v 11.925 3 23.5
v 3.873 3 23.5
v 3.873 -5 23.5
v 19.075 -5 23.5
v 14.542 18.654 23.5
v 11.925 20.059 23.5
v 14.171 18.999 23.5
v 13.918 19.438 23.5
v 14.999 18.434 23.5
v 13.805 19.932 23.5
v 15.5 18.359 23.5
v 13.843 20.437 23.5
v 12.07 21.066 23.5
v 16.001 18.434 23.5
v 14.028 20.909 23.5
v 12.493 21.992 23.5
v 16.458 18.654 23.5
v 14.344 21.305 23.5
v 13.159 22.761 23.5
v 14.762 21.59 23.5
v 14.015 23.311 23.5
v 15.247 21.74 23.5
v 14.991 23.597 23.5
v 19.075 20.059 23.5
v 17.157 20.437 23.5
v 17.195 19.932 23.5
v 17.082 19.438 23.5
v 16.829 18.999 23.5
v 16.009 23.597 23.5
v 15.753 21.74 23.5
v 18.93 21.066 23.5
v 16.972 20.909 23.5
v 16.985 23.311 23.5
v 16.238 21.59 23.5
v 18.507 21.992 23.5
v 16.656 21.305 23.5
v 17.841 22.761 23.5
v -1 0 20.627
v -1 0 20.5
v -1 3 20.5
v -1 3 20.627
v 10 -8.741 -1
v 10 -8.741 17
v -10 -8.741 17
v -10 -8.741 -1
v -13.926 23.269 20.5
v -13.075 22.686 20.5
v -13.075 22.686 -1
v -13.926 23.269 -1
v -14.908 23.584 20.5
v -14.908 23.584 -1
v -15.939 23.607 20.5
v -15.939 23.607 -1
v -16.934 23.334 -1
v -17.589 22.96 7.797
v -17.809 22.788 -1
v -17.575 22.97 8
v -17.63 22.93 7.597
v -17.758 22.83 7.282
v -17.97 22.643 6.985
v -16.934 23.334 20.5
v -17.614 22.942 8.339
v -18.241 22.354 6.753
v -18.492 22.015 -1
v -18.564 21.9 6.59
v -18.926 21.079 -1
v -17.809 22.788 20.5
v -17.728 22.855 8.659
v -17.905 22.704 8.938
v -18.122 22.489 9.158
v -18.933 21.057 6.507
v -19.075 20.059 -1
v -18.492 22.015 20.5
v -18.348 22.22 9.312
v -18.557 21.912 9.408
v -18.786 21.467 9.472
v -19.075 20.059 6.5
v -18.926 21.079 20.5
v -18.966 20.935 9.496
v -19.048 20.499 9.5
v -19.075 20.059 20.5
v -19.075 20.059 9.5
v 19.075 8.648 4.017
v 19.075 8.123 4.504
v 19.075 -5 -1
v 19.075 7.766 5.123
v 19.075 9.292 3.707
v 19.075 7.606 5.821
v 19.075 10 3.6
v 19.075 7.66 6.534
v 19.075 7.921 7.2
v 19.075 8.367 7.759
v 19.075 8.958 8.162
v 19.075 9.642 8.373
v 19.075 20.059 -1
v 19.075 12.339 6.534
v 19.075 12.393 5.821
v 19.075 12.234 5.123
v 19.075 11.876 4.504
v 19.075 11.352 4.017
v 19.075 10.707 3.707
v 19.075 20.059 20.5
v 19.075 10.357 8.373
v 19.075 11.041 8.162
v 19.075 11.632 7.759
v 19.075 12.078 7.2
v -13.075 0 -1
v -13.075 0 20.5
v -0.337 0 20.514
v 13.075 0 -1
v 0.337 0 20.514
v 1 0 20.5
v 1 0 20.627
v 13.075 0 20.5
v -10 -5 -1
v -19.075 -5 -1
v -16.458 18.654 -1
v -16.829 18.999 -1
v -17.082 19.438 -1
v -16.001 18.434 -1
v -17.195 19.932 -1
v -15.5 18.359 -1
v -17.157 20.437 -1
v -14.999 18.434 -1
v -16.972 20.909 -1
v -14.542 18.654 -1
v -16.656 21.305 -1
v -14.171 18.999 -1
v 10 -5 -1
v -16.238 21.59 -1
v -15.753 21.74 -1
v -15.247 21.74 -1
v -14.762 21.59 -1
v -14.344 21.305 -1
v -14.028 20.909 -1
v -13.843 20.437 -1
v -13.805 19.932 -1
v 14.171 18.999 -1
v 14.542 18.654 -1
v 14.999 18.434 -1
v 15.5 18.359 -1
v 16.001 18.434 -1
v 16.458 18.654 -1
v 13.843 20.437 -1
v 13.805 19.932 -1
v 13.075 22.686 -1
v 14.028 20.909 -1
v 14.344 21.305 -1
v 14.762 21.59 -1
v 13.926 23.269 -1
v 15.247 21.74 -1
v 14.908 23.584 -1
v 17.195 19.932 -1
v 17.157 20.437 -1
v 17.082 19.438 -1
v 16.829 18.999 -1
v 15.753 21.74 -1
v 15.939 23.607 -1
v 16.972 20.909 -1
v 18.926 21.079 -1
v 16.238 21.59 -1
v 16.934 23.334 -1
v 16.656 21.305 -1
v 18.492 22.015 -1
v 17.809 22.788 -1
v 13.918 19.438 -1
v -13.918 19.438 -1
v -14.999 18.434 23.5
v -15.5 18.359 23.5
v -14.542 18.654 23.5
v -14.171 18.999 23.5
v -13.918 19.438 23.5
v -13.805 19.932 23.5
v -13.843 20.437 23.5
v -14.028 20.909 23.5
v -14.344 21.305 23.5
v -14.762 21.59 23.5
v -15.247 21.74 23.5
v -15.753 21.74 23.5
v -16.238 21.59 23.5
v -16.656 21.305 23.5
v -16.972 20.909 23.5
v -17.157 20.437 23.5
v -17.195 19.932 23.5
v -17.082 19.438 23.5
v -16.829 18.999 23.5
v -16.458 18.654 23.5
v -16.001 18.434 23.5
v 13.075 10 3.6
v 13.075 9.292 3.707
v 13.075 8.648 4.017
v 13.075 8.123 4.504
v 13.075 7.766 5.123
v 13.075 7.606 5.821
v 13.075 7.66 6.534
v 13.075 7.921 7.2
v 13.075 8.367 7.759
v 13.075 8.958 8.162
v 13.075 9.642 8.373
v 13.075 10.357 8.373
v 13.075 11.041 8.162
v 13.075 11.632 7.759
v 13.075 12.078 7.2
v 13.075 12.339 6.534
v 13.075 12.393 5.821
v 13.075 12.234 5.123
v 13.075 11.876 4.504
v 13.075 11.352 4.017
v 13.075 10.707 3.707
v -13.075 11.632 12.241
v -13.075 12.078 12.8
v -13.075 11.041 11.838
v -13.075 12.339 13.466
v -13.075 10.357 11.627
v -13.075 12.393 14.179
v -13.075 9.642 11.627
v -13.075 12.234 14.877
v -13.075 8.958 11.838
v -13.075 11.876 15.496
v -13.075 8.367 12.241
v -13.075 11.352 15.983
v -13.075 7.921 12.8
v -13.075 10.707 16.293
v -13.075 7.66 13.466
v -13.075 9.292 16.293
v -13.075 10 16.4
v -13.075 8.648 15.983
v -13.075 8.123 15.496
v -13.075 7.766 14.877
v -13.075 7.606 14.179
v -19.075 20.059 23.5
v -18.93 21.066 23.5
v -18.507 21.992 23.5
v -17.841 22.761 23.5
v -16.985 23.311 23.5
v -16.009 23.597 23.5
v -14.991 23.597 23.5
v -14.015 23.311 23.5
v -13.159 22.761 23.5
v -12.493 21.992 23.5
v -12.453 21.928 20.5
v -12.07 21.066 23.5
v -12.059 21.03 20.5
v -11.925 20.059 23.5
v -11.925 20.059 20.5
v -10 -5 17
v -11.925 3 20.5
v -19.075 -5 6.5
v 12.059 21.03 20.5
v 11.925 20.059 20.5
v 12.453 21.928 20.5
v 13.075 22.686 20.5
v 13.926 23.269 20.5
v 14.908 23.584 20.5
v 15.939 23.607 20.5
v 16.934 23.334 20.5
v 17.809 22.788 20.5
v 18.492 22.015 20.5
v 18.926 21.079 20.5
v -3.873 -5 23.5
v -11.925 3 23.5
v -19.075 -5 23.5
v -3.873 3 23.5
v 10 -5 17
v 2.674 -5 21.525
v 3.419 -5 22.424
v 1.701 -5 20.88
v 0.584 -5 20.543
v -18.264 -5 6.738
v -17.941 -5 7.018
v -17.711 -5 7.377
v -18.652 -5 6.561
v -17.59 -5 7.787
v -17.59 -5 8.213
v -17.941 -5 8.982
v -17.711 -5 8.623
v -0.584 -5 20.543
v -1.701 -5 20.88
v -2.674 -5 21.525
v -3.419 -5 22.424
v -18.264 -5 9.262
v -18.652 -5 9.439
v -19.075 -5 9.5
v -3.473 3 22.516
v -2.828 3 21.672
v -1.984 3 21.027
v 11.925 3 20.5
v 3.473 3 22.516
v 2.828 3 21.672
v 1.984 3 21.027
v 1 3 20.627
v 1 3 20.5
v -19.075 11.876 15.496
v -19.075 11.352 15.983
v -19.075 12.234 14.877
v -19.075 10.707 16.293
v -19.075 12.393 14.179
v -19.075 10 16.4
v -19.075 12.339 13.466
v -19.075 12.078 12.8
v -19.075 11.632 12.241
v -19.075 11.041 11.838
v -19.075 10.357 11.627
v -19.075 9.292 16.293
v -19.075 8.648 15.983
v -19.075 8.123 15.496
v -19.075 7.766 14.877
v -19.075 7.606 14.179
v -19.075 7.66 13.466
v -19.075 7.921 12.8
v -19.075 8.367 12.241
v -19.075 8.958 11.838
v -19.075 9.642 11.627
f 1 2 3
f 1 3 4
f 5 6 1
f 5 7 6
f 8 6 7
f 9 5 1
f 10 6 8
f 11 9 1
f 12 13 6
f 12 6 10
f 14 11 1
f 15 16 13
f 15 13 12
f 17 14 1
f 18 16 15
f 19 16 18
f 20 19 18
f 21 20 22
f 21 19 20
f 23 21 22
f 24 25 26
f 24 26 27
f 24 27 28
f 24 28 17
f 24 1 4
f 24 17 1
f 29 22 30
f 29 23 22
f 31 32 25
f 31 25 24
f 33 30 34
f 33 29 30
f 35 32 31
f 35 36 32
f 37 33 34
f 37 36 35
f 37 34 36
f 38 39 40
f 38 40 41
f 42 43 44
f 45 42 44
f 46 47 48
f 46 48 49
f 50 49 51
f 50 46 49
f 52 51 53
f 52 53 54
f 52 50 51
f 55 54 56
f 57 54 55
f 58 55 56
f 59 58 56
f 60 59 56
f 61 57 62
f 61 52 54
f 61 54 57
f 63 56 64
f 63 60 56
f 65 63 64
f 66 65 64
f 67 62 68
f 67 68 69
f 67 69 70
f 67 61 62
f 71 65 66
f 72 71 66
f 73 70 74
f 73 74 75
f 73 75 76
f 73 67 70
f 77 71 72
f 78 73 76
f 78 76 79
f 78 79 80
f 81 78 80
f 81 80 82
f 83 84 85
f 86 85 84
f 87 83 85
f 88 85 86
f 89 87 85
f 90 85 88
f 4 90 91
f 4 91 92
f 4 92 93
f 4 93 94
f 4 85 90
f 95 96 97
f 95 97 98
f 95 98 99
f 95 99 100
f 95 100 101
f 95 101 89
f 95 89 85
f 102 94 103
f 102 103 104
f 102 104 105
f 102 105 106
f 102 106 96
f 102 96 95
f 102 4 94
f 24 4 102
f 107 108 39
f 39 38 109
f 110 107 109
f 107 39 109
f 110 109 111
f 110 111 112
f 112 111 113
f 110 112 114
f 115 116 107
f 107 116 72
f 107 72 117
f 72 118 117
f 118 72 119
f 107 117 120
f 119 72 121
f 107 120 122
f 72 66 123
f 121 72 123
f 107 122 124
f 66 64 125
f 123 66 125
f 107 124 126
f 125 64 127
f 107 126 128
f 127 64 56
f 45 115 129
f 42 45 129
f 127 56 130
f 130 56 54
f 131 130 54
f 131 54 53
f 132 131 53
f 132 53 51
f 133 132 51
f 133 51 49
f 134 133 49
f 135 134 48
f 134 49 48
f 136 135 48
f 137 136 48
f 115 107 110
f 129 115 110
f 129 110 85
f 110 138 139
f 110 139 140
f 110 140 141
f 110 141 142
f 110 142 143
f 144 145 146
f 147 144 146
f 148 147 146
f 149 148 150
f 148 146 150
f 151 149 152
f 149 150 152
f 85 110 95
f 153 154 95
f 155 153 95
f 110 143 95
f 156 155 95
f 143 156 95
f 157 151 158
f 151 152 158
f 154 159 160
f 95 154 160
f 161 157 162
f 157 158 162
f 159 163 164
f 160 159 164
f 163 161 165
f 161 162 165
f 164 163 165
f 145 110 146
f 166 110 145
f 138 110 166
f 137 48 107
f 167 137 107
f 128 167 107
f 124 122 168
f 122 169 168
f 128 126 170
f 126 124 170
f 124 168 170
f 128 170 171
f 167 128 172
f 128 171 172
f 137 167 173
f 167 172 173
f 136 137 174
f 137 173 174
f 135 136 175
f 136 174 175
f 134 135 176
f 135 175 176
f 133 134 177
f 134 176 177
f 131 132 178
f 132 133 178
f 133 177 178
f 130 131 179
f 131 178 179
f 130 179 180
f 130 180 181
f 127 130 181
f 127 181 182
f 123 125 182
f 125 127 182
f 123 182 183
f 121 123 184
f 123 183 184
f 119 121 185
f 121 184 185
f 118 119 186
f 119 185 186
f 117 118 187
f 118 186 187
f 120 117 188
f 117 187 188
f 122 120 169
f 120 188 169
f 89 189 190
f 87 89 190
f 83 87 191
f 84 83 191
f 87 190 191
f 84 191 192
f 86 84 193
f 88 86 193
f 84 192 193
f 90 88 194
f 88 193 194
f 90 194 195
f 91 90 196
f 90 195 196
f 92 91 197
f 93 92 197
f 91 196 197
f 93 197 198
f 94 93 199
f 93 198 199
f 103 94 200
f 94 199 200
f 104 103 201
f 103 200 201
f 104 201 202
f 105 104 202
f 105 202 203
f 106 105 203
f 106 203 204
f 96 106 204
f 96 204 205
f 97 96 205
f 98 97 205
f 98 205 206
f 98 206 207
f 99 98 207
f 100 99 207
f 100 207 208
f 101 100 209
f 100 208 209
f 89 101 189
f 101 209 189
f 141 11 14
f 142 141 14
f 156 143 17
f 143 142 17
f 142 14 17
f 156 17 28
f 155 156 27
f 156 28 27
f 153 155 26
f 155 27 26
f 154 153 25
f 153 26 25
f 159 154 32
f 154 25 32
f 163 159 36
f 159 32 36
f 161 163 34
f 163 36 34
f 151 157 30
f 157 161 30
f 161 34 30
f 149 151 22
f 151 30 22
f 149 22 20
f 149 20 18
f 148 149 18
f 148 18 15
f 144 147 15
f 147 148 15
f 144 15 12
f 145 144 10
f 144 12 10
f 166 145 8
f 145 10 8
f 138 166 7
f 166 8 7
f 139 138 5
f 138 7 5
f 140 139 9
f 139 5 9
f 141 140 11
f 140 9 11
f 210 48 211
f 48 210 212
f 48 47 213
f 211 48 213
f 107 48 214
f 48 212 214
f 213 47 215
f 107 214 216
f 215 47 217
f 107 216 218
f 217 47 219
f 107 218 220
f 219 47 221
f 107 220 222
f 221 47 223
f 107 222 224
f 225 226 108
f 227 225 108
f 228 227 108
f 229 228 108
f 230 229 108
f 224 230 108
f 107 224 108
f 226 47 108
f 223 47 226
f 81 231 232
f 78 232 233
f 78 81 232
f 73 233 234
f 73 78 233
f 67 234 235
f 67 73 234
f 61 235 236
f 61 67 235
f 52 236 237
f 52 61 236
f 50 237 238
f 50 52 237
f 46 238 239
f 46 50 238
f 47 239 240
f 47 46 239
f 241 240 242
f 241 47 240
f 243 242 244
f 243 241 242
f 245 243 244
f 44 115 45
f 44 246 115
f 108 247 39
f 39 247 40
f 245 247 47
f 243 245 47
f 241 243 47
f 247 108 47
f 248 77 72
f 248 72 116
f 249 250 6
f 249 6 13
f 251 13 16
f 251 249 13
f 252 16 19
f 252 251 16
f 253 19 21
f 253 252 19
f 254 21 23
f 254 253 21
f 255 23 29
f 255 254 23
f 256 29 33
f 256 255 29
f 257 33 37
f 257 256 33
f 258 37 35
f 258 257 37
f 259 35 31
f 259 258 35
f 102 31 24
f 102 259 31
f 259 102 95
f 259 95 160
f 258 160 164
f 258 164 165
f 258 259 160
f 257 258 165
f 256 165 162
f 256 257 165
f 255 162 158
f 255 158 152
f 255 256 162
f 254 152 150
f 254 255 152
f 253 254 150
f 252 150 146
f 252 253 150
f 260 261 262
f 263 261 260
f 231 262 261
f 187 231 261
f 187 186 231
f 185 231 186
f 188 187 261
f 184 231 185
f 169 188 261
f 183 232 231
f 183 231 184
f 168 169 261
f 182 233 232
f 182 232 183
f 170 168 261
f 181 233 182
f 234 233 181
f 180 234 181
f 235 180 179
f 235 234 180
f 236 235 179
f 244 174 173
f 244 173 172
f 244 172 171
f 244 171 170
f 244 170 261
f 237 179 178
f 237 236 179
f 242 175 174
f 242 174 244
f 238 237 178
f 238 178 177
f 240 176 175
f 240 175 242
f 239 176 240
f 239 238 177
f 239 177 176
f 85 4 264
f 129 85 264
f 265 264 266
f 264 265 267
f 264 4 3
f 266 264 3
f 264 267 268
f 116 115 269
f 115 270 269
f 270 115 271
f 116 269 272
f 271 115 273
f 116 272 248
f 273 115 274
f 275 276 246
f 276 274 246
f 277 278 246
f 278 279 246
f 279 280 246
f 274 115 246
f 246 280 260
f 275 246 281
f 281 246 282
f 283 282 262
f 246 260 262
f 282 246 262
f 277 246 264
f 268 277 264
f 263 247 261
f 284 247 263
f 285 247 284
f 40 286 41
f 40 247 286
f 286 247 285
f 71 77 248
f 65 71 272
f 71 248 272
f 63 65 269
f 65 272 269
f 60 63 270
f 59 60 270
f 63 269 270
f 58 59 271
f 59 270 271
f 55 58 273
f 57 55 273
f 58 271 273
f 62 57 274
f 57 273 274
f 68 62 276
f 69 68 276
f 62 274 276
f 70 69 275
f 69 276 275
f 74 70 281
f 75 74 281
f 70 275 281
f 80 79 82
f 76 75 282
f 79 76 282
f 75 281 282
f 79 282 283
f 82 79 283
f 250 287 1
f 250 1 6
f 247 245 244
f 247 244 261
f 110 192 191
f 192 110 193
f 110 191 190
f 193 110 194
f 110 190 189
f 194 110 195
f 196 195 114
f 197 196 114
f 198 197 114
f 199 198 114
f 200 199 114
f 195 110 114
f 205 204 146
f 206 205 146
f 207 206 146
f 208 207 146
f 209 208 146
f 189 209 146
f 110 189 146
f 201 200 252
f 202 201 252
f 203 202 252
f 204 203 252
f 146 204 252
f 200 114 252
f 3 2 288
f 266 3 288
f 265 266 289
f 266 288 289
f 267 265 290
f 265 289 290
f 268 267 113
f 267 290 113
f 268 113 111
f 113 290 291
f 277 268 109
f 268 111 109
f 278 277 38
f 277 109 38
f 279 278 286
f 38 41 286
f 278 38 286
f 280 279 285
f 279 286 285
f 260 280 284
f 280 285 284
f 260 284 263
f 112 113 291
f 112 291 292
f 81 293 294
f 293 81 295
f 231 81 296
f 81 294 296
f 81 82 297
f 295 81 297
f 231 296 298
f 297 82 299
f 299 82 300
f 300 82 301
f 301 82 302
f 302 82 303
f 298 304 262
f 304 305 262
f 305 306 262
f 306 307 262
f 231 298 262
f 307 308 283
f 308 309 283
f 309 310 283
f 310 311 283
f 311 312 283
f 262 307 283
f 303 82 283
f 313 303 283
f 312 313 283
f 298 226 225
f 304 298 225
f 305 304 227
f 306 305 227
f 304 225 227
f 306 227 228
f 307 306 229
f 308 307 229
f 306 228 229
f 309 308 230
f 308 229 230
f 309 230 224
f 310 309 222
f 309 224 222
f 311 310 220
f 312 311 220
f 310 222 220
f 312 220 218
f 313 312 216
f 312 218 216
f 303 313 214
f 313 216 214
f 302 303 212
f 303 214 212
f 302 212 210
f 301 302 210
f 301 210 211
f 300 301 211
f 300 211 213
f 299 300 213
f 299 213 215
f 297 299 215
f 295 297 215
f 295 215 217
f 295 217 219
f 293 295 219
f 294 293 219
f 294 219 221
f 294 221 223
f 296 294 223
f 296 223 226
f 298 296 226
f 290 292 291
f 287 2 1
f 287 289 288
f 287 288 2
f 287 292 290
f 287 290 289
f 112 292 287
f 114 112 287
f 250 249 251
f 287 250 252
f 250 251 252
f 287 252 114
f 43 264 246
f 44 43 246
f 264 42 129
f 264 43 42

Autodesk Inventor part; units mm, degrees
ref_plane "YZ Plane" through (0, 0, 0) normal (1, 0, 0) x (0, 1, 0)
ref_plane "XZ Plane" through (0, 0, 0) normal (0, 1, 0) x (-1, 0, 0)
ref_plane "XY Plane" through (0, 0, 0) normal (0, 0, 1) x (1, 0, 0)
sketch "Sketch1" plane through (0, 0, 0) normal (0, 0, 1) x (1, 0, 0)
  line L0 (-13.075, 0) -> (13.075, 0)
  line L1 (13.075, 0) -> (13.075, 22.6856)
  line L2 (-13.075, 22.6856) -> (-13.075, 0)
  line L3 (-19.075, -5) -> (11.925, -5)
  line L4 (19.075, -5) -> (19.075, 20.0588)
  line L5 (-19.075, 20.0588) -> (-19.075, -5)
  circle A0 centre (-15.5, 20.0588) radius 1.5
  circle A1 centre (15.5, 20.0588) radius 1.5
  arc A2 (19.075, 20.0588) -> (13.075, 22.6856) centre (15.5, 20.0588) ccw
  arc A3 (-13.075, 22.6856) -> (-19.075, 20.0588) centre (-15.5, 20.0588) ccw
  line L6 (11.925, -5) -> (19.075, -5)
  point P0 (0, 0)
  dimension "d8" = 5
  dimension "d10" = 6
  dimension "d12" = 31
  dimension "d14" = 3
  dimension "d15" = 3
  dimension "d17" = 26.15
  dimension "d18" = 13.075
  dimension "d19" = 15.5
extrude "Extrusion1" add sketch "Sketch1" along normal blind 20.5 contours L0 L1 A2 L4 L6 L3 L5 A3 L2 | A0 | A1
sketch "Sketch4" plane through (0, 0, 20.5) normal (0, 0, 1) x (1, 0, 0)
  arc A0 (-11.925, 20.0588) -> (-19.075, 20.0588) centre (-15.5, 20.0588) ccw
  arc A1 (19.075, 20.0588) -> (11.925, 20.0588) centre (15.5, 20.0588) ccw
  arc A2 (19.075, 20.0588) -> (13.075, 22.6856) centre (15.5, 20.0588) ccw projected
  arc A3 (-13.075, 22.6856) -> (-19.075, 20.0588) centre (-15.5, 20.0588) ccw projected
  line L0 (-19.075, -5) -> (19.075, -5) projected
  line L1 (19.075, -5) -> (19.075, 20.0588) projected
  arc A4 (19.075, 20.0588) -> (13.075, 22.6856) centre (15.5, 20.0588) ccw projected
  line L2 (13.075, 22.6856) -> (13.075, 0) projected
  line L3 (13.075, 0) -> (-13.075, 0) projected
  line L4 (-13.075, 0) -> (-13.075, 22.6856) projected
  arc A5 (-13.075, 22.6856) -> (-19.075, 20.0588) centre (-15.5, 20.0588) ccw projected
  line L5 (-19.075, 20.0588) -> (-19.075, -5) projected
  line L6 (-11.925, 20.0588) -> (-11.925, 3)
  line L7 (-11.925, 3) -> (11.925, 3)
  line L8 (11.925, 3) -> (11.925, 20.0588)
  point P0 (0, 0)
  point P1 (13.075, 22.6856)
  point P2 (13.075, 22.6856)
  dimension "d37" = 3
extrude "Extrusion3" add sketch "Sketch4" along normal blind 3
sketch "Sketch5" plane through (0, 0, 23.5) normal (0, 0, 1) x (1, 0, 0)
  arc A0 (-13.075, 22.6856) -> (-19.075, 20.0588) centre (-15.5, 20.0588) ccw projected
  arc A1 (19.075, 20.0588) -> (13.075, 22.6856) centre (15.5, 20.0588) ccw projected
  point P0 (0, 0)
hole "Hole2" at (-15.5, 20.0588, 23.5) at (15.5, 20.0588, 23.5) direction (0, 0, -1) diameter 3.4 end through all clearance for "Socket Head Cap Screw" size "M3" standard "Ansi Metric M Profile"
sketch "Sketch8" plane through (-13.075, 0, 0) normal (0, 1, 0) x (1, 0, 0)
  circle A0 centre (13.075, -24.5) radius 4
  line L0 (25, -23.5) -> (1.15, -23.5) projected
  point P0 (13.075, 0)
  dimension "d62" = 8
  dimension "d63" = 1
extrude "Extrusion5" cut sketch "Sketch8" against normal through all both and the other way through all
sketch "Sketch9" plane through (-13.075, 0, 0) normal (0, 1, 0) x (1, 0, 0)
  line L0 (12.075, -28.8924) -> (14.075, -28.8924)
  line L1 (14.075, -28.8924) -> (14.075, -18.1034)
  line L2 (14.075, -18.1034) -> (12.075, -18.1034)
  line L3 (12.075, -18.1034) -> (12.075, -28.8924)
  line L4 (12.075, -28.8924) -> (14.075, -18.1034) construction
  line L5 (14.075, -28.8924) -> (12.075, -18.1034) construction
  point P0 (13.075, 0)
  point P1 (13.075, -23.4979)
  dimension "d66" = 2
extrude "Extrusion6" cut sketch "Sketch9" along normal blind 10
sketch "Sketch10" plane through (19.075, -5, 0) normal (1, 0, 0) x (0, 0, -1)
  circle A0 centre (-6, 14.9996) radius 2
  line L0 (0, 0) -> (-23.5, 0) projected
  line L1 (0, 0) -> (0, 25.0588) projected
  line L2 (0, 27.6856) -> (-20.5, 27.6856) projected
  point P0 (0, 5)
  dimension "d70" = 6
  dimension "d71" = 4
  dimension "d88" = 12.686
hole "Hole4" at (19.075, 9.9996, 6) direction (-1, 0, 0) diameter 4.8 depth 6 clearance for "Socket Head Cap Screw" size "M4" standard "Ansi Metric M Profile"
sketch "Sketch11" plane through (-19.075, -5, 0) normal (-1, 0, 0) x (0, 0, 1)
  circle A0 centre (14, 14.9996) radius 3.2686
  line L0 (0, 0) -> (23.5, 0) projected
  circle A1 centre (6, 14.9996) radius 2.4 projected
  line L1 (0, 27.6856) -> (20.5, 27.6856) projected
  point P0 (0, 5)
  point P1 (10.9595, 8.3093)
  dimension "d80" = 8
  dimension "d89" = 12.686
hole "Hole5" at (-19.075, 9.9996, 14) direction (1, 0, 0) diameter 4.8 depth 6 clearance for "Socket Head Cap Screw" size "M4" standard "Ansi Metric M Profile"
sketch "Sketch12" plane through (-19.075, -5, 0) normal (0, -1, 0) x (1, 0, 0)
  line L0 (38.15, 0) -> (38.15, 23.5) projected
  circle A0 centre (0, 8) radius 1.5
  line L1 (0, 0) -> (0, 23.5) projected
  line L2 (0, 0) -> (38.15, 0) projected
  point P0 (19.075, 0)
  dimension "d93" = 3
  dimension "d94" = 8
extrude "Extrusion7" cut sketch "Sketch12" against normal through all
sketch "Sketch13" plane through (0, 0, 0) normal (0, 0, -1) x (-1, 0, 0)
  circle A0 centre (15.5, 20.0588) radius 1.7 projected
  circle A1 centre (-15.5, 20.0588) radius 1.7 projected
  line L0 (19.075, 20.0588) -> (19.075, -5) projected
  arc A2 (19.075, 20.0588) -> (13.075, 22.6856) centre (15.5, 20.0588) ccw projected
  line L1 (13.075, 0) -> (13.075, 22.6856) projected
  line L2 (-13.075, 0) -> (13.075, 0) projected
  line L3 (-13.075, 22.6856) -> (-13.075, 0) projected
  arc A3 (-13.075, 22.6856) -> (-19.075, 20.0588) centre (-15.5, 20.0588) ccw projected
  line L4 (-19.075, -5) -> (-19.075, 20.0588) projected
  line L5 (19.075, -5) -> (-19.075, -5) projected
  line L6 (-4.8329, -8.7412) -> (5.1671, -8.7412) projected
  line L7 (-10, -1.2588) -> (10, -1.2588)
  line L8 (10, -1.2588) -> (10, -8.7412)
  line L9 (10, -8.7412) -> (-10, -8.7412)
  line L10 (-10, -8.7412) -> (-10, -1.2588)
  line L11 (19.075, -5) -> (-19.075, -5) projected
  line L12 (-10, -1.2588) -> (10, -8.7412) construction
  line L13 (10, -1.2588) -> (-10, -8.7412) construction
  point P0 (0, 0)
  point P1 (0, -5)
  point P2 (-10, -5)
  point P3 (10, -5)
  dimension "d95" = 20
extrude "Extrusion8" add sketch "Sketch13" against normal blind 17 contours L8 L9 L6 L10 L5
move faces "Move1" translate (0, 0, -1) faces at (-17.075, 5.0196, 0)
properties part number "SolenoidBracket"
